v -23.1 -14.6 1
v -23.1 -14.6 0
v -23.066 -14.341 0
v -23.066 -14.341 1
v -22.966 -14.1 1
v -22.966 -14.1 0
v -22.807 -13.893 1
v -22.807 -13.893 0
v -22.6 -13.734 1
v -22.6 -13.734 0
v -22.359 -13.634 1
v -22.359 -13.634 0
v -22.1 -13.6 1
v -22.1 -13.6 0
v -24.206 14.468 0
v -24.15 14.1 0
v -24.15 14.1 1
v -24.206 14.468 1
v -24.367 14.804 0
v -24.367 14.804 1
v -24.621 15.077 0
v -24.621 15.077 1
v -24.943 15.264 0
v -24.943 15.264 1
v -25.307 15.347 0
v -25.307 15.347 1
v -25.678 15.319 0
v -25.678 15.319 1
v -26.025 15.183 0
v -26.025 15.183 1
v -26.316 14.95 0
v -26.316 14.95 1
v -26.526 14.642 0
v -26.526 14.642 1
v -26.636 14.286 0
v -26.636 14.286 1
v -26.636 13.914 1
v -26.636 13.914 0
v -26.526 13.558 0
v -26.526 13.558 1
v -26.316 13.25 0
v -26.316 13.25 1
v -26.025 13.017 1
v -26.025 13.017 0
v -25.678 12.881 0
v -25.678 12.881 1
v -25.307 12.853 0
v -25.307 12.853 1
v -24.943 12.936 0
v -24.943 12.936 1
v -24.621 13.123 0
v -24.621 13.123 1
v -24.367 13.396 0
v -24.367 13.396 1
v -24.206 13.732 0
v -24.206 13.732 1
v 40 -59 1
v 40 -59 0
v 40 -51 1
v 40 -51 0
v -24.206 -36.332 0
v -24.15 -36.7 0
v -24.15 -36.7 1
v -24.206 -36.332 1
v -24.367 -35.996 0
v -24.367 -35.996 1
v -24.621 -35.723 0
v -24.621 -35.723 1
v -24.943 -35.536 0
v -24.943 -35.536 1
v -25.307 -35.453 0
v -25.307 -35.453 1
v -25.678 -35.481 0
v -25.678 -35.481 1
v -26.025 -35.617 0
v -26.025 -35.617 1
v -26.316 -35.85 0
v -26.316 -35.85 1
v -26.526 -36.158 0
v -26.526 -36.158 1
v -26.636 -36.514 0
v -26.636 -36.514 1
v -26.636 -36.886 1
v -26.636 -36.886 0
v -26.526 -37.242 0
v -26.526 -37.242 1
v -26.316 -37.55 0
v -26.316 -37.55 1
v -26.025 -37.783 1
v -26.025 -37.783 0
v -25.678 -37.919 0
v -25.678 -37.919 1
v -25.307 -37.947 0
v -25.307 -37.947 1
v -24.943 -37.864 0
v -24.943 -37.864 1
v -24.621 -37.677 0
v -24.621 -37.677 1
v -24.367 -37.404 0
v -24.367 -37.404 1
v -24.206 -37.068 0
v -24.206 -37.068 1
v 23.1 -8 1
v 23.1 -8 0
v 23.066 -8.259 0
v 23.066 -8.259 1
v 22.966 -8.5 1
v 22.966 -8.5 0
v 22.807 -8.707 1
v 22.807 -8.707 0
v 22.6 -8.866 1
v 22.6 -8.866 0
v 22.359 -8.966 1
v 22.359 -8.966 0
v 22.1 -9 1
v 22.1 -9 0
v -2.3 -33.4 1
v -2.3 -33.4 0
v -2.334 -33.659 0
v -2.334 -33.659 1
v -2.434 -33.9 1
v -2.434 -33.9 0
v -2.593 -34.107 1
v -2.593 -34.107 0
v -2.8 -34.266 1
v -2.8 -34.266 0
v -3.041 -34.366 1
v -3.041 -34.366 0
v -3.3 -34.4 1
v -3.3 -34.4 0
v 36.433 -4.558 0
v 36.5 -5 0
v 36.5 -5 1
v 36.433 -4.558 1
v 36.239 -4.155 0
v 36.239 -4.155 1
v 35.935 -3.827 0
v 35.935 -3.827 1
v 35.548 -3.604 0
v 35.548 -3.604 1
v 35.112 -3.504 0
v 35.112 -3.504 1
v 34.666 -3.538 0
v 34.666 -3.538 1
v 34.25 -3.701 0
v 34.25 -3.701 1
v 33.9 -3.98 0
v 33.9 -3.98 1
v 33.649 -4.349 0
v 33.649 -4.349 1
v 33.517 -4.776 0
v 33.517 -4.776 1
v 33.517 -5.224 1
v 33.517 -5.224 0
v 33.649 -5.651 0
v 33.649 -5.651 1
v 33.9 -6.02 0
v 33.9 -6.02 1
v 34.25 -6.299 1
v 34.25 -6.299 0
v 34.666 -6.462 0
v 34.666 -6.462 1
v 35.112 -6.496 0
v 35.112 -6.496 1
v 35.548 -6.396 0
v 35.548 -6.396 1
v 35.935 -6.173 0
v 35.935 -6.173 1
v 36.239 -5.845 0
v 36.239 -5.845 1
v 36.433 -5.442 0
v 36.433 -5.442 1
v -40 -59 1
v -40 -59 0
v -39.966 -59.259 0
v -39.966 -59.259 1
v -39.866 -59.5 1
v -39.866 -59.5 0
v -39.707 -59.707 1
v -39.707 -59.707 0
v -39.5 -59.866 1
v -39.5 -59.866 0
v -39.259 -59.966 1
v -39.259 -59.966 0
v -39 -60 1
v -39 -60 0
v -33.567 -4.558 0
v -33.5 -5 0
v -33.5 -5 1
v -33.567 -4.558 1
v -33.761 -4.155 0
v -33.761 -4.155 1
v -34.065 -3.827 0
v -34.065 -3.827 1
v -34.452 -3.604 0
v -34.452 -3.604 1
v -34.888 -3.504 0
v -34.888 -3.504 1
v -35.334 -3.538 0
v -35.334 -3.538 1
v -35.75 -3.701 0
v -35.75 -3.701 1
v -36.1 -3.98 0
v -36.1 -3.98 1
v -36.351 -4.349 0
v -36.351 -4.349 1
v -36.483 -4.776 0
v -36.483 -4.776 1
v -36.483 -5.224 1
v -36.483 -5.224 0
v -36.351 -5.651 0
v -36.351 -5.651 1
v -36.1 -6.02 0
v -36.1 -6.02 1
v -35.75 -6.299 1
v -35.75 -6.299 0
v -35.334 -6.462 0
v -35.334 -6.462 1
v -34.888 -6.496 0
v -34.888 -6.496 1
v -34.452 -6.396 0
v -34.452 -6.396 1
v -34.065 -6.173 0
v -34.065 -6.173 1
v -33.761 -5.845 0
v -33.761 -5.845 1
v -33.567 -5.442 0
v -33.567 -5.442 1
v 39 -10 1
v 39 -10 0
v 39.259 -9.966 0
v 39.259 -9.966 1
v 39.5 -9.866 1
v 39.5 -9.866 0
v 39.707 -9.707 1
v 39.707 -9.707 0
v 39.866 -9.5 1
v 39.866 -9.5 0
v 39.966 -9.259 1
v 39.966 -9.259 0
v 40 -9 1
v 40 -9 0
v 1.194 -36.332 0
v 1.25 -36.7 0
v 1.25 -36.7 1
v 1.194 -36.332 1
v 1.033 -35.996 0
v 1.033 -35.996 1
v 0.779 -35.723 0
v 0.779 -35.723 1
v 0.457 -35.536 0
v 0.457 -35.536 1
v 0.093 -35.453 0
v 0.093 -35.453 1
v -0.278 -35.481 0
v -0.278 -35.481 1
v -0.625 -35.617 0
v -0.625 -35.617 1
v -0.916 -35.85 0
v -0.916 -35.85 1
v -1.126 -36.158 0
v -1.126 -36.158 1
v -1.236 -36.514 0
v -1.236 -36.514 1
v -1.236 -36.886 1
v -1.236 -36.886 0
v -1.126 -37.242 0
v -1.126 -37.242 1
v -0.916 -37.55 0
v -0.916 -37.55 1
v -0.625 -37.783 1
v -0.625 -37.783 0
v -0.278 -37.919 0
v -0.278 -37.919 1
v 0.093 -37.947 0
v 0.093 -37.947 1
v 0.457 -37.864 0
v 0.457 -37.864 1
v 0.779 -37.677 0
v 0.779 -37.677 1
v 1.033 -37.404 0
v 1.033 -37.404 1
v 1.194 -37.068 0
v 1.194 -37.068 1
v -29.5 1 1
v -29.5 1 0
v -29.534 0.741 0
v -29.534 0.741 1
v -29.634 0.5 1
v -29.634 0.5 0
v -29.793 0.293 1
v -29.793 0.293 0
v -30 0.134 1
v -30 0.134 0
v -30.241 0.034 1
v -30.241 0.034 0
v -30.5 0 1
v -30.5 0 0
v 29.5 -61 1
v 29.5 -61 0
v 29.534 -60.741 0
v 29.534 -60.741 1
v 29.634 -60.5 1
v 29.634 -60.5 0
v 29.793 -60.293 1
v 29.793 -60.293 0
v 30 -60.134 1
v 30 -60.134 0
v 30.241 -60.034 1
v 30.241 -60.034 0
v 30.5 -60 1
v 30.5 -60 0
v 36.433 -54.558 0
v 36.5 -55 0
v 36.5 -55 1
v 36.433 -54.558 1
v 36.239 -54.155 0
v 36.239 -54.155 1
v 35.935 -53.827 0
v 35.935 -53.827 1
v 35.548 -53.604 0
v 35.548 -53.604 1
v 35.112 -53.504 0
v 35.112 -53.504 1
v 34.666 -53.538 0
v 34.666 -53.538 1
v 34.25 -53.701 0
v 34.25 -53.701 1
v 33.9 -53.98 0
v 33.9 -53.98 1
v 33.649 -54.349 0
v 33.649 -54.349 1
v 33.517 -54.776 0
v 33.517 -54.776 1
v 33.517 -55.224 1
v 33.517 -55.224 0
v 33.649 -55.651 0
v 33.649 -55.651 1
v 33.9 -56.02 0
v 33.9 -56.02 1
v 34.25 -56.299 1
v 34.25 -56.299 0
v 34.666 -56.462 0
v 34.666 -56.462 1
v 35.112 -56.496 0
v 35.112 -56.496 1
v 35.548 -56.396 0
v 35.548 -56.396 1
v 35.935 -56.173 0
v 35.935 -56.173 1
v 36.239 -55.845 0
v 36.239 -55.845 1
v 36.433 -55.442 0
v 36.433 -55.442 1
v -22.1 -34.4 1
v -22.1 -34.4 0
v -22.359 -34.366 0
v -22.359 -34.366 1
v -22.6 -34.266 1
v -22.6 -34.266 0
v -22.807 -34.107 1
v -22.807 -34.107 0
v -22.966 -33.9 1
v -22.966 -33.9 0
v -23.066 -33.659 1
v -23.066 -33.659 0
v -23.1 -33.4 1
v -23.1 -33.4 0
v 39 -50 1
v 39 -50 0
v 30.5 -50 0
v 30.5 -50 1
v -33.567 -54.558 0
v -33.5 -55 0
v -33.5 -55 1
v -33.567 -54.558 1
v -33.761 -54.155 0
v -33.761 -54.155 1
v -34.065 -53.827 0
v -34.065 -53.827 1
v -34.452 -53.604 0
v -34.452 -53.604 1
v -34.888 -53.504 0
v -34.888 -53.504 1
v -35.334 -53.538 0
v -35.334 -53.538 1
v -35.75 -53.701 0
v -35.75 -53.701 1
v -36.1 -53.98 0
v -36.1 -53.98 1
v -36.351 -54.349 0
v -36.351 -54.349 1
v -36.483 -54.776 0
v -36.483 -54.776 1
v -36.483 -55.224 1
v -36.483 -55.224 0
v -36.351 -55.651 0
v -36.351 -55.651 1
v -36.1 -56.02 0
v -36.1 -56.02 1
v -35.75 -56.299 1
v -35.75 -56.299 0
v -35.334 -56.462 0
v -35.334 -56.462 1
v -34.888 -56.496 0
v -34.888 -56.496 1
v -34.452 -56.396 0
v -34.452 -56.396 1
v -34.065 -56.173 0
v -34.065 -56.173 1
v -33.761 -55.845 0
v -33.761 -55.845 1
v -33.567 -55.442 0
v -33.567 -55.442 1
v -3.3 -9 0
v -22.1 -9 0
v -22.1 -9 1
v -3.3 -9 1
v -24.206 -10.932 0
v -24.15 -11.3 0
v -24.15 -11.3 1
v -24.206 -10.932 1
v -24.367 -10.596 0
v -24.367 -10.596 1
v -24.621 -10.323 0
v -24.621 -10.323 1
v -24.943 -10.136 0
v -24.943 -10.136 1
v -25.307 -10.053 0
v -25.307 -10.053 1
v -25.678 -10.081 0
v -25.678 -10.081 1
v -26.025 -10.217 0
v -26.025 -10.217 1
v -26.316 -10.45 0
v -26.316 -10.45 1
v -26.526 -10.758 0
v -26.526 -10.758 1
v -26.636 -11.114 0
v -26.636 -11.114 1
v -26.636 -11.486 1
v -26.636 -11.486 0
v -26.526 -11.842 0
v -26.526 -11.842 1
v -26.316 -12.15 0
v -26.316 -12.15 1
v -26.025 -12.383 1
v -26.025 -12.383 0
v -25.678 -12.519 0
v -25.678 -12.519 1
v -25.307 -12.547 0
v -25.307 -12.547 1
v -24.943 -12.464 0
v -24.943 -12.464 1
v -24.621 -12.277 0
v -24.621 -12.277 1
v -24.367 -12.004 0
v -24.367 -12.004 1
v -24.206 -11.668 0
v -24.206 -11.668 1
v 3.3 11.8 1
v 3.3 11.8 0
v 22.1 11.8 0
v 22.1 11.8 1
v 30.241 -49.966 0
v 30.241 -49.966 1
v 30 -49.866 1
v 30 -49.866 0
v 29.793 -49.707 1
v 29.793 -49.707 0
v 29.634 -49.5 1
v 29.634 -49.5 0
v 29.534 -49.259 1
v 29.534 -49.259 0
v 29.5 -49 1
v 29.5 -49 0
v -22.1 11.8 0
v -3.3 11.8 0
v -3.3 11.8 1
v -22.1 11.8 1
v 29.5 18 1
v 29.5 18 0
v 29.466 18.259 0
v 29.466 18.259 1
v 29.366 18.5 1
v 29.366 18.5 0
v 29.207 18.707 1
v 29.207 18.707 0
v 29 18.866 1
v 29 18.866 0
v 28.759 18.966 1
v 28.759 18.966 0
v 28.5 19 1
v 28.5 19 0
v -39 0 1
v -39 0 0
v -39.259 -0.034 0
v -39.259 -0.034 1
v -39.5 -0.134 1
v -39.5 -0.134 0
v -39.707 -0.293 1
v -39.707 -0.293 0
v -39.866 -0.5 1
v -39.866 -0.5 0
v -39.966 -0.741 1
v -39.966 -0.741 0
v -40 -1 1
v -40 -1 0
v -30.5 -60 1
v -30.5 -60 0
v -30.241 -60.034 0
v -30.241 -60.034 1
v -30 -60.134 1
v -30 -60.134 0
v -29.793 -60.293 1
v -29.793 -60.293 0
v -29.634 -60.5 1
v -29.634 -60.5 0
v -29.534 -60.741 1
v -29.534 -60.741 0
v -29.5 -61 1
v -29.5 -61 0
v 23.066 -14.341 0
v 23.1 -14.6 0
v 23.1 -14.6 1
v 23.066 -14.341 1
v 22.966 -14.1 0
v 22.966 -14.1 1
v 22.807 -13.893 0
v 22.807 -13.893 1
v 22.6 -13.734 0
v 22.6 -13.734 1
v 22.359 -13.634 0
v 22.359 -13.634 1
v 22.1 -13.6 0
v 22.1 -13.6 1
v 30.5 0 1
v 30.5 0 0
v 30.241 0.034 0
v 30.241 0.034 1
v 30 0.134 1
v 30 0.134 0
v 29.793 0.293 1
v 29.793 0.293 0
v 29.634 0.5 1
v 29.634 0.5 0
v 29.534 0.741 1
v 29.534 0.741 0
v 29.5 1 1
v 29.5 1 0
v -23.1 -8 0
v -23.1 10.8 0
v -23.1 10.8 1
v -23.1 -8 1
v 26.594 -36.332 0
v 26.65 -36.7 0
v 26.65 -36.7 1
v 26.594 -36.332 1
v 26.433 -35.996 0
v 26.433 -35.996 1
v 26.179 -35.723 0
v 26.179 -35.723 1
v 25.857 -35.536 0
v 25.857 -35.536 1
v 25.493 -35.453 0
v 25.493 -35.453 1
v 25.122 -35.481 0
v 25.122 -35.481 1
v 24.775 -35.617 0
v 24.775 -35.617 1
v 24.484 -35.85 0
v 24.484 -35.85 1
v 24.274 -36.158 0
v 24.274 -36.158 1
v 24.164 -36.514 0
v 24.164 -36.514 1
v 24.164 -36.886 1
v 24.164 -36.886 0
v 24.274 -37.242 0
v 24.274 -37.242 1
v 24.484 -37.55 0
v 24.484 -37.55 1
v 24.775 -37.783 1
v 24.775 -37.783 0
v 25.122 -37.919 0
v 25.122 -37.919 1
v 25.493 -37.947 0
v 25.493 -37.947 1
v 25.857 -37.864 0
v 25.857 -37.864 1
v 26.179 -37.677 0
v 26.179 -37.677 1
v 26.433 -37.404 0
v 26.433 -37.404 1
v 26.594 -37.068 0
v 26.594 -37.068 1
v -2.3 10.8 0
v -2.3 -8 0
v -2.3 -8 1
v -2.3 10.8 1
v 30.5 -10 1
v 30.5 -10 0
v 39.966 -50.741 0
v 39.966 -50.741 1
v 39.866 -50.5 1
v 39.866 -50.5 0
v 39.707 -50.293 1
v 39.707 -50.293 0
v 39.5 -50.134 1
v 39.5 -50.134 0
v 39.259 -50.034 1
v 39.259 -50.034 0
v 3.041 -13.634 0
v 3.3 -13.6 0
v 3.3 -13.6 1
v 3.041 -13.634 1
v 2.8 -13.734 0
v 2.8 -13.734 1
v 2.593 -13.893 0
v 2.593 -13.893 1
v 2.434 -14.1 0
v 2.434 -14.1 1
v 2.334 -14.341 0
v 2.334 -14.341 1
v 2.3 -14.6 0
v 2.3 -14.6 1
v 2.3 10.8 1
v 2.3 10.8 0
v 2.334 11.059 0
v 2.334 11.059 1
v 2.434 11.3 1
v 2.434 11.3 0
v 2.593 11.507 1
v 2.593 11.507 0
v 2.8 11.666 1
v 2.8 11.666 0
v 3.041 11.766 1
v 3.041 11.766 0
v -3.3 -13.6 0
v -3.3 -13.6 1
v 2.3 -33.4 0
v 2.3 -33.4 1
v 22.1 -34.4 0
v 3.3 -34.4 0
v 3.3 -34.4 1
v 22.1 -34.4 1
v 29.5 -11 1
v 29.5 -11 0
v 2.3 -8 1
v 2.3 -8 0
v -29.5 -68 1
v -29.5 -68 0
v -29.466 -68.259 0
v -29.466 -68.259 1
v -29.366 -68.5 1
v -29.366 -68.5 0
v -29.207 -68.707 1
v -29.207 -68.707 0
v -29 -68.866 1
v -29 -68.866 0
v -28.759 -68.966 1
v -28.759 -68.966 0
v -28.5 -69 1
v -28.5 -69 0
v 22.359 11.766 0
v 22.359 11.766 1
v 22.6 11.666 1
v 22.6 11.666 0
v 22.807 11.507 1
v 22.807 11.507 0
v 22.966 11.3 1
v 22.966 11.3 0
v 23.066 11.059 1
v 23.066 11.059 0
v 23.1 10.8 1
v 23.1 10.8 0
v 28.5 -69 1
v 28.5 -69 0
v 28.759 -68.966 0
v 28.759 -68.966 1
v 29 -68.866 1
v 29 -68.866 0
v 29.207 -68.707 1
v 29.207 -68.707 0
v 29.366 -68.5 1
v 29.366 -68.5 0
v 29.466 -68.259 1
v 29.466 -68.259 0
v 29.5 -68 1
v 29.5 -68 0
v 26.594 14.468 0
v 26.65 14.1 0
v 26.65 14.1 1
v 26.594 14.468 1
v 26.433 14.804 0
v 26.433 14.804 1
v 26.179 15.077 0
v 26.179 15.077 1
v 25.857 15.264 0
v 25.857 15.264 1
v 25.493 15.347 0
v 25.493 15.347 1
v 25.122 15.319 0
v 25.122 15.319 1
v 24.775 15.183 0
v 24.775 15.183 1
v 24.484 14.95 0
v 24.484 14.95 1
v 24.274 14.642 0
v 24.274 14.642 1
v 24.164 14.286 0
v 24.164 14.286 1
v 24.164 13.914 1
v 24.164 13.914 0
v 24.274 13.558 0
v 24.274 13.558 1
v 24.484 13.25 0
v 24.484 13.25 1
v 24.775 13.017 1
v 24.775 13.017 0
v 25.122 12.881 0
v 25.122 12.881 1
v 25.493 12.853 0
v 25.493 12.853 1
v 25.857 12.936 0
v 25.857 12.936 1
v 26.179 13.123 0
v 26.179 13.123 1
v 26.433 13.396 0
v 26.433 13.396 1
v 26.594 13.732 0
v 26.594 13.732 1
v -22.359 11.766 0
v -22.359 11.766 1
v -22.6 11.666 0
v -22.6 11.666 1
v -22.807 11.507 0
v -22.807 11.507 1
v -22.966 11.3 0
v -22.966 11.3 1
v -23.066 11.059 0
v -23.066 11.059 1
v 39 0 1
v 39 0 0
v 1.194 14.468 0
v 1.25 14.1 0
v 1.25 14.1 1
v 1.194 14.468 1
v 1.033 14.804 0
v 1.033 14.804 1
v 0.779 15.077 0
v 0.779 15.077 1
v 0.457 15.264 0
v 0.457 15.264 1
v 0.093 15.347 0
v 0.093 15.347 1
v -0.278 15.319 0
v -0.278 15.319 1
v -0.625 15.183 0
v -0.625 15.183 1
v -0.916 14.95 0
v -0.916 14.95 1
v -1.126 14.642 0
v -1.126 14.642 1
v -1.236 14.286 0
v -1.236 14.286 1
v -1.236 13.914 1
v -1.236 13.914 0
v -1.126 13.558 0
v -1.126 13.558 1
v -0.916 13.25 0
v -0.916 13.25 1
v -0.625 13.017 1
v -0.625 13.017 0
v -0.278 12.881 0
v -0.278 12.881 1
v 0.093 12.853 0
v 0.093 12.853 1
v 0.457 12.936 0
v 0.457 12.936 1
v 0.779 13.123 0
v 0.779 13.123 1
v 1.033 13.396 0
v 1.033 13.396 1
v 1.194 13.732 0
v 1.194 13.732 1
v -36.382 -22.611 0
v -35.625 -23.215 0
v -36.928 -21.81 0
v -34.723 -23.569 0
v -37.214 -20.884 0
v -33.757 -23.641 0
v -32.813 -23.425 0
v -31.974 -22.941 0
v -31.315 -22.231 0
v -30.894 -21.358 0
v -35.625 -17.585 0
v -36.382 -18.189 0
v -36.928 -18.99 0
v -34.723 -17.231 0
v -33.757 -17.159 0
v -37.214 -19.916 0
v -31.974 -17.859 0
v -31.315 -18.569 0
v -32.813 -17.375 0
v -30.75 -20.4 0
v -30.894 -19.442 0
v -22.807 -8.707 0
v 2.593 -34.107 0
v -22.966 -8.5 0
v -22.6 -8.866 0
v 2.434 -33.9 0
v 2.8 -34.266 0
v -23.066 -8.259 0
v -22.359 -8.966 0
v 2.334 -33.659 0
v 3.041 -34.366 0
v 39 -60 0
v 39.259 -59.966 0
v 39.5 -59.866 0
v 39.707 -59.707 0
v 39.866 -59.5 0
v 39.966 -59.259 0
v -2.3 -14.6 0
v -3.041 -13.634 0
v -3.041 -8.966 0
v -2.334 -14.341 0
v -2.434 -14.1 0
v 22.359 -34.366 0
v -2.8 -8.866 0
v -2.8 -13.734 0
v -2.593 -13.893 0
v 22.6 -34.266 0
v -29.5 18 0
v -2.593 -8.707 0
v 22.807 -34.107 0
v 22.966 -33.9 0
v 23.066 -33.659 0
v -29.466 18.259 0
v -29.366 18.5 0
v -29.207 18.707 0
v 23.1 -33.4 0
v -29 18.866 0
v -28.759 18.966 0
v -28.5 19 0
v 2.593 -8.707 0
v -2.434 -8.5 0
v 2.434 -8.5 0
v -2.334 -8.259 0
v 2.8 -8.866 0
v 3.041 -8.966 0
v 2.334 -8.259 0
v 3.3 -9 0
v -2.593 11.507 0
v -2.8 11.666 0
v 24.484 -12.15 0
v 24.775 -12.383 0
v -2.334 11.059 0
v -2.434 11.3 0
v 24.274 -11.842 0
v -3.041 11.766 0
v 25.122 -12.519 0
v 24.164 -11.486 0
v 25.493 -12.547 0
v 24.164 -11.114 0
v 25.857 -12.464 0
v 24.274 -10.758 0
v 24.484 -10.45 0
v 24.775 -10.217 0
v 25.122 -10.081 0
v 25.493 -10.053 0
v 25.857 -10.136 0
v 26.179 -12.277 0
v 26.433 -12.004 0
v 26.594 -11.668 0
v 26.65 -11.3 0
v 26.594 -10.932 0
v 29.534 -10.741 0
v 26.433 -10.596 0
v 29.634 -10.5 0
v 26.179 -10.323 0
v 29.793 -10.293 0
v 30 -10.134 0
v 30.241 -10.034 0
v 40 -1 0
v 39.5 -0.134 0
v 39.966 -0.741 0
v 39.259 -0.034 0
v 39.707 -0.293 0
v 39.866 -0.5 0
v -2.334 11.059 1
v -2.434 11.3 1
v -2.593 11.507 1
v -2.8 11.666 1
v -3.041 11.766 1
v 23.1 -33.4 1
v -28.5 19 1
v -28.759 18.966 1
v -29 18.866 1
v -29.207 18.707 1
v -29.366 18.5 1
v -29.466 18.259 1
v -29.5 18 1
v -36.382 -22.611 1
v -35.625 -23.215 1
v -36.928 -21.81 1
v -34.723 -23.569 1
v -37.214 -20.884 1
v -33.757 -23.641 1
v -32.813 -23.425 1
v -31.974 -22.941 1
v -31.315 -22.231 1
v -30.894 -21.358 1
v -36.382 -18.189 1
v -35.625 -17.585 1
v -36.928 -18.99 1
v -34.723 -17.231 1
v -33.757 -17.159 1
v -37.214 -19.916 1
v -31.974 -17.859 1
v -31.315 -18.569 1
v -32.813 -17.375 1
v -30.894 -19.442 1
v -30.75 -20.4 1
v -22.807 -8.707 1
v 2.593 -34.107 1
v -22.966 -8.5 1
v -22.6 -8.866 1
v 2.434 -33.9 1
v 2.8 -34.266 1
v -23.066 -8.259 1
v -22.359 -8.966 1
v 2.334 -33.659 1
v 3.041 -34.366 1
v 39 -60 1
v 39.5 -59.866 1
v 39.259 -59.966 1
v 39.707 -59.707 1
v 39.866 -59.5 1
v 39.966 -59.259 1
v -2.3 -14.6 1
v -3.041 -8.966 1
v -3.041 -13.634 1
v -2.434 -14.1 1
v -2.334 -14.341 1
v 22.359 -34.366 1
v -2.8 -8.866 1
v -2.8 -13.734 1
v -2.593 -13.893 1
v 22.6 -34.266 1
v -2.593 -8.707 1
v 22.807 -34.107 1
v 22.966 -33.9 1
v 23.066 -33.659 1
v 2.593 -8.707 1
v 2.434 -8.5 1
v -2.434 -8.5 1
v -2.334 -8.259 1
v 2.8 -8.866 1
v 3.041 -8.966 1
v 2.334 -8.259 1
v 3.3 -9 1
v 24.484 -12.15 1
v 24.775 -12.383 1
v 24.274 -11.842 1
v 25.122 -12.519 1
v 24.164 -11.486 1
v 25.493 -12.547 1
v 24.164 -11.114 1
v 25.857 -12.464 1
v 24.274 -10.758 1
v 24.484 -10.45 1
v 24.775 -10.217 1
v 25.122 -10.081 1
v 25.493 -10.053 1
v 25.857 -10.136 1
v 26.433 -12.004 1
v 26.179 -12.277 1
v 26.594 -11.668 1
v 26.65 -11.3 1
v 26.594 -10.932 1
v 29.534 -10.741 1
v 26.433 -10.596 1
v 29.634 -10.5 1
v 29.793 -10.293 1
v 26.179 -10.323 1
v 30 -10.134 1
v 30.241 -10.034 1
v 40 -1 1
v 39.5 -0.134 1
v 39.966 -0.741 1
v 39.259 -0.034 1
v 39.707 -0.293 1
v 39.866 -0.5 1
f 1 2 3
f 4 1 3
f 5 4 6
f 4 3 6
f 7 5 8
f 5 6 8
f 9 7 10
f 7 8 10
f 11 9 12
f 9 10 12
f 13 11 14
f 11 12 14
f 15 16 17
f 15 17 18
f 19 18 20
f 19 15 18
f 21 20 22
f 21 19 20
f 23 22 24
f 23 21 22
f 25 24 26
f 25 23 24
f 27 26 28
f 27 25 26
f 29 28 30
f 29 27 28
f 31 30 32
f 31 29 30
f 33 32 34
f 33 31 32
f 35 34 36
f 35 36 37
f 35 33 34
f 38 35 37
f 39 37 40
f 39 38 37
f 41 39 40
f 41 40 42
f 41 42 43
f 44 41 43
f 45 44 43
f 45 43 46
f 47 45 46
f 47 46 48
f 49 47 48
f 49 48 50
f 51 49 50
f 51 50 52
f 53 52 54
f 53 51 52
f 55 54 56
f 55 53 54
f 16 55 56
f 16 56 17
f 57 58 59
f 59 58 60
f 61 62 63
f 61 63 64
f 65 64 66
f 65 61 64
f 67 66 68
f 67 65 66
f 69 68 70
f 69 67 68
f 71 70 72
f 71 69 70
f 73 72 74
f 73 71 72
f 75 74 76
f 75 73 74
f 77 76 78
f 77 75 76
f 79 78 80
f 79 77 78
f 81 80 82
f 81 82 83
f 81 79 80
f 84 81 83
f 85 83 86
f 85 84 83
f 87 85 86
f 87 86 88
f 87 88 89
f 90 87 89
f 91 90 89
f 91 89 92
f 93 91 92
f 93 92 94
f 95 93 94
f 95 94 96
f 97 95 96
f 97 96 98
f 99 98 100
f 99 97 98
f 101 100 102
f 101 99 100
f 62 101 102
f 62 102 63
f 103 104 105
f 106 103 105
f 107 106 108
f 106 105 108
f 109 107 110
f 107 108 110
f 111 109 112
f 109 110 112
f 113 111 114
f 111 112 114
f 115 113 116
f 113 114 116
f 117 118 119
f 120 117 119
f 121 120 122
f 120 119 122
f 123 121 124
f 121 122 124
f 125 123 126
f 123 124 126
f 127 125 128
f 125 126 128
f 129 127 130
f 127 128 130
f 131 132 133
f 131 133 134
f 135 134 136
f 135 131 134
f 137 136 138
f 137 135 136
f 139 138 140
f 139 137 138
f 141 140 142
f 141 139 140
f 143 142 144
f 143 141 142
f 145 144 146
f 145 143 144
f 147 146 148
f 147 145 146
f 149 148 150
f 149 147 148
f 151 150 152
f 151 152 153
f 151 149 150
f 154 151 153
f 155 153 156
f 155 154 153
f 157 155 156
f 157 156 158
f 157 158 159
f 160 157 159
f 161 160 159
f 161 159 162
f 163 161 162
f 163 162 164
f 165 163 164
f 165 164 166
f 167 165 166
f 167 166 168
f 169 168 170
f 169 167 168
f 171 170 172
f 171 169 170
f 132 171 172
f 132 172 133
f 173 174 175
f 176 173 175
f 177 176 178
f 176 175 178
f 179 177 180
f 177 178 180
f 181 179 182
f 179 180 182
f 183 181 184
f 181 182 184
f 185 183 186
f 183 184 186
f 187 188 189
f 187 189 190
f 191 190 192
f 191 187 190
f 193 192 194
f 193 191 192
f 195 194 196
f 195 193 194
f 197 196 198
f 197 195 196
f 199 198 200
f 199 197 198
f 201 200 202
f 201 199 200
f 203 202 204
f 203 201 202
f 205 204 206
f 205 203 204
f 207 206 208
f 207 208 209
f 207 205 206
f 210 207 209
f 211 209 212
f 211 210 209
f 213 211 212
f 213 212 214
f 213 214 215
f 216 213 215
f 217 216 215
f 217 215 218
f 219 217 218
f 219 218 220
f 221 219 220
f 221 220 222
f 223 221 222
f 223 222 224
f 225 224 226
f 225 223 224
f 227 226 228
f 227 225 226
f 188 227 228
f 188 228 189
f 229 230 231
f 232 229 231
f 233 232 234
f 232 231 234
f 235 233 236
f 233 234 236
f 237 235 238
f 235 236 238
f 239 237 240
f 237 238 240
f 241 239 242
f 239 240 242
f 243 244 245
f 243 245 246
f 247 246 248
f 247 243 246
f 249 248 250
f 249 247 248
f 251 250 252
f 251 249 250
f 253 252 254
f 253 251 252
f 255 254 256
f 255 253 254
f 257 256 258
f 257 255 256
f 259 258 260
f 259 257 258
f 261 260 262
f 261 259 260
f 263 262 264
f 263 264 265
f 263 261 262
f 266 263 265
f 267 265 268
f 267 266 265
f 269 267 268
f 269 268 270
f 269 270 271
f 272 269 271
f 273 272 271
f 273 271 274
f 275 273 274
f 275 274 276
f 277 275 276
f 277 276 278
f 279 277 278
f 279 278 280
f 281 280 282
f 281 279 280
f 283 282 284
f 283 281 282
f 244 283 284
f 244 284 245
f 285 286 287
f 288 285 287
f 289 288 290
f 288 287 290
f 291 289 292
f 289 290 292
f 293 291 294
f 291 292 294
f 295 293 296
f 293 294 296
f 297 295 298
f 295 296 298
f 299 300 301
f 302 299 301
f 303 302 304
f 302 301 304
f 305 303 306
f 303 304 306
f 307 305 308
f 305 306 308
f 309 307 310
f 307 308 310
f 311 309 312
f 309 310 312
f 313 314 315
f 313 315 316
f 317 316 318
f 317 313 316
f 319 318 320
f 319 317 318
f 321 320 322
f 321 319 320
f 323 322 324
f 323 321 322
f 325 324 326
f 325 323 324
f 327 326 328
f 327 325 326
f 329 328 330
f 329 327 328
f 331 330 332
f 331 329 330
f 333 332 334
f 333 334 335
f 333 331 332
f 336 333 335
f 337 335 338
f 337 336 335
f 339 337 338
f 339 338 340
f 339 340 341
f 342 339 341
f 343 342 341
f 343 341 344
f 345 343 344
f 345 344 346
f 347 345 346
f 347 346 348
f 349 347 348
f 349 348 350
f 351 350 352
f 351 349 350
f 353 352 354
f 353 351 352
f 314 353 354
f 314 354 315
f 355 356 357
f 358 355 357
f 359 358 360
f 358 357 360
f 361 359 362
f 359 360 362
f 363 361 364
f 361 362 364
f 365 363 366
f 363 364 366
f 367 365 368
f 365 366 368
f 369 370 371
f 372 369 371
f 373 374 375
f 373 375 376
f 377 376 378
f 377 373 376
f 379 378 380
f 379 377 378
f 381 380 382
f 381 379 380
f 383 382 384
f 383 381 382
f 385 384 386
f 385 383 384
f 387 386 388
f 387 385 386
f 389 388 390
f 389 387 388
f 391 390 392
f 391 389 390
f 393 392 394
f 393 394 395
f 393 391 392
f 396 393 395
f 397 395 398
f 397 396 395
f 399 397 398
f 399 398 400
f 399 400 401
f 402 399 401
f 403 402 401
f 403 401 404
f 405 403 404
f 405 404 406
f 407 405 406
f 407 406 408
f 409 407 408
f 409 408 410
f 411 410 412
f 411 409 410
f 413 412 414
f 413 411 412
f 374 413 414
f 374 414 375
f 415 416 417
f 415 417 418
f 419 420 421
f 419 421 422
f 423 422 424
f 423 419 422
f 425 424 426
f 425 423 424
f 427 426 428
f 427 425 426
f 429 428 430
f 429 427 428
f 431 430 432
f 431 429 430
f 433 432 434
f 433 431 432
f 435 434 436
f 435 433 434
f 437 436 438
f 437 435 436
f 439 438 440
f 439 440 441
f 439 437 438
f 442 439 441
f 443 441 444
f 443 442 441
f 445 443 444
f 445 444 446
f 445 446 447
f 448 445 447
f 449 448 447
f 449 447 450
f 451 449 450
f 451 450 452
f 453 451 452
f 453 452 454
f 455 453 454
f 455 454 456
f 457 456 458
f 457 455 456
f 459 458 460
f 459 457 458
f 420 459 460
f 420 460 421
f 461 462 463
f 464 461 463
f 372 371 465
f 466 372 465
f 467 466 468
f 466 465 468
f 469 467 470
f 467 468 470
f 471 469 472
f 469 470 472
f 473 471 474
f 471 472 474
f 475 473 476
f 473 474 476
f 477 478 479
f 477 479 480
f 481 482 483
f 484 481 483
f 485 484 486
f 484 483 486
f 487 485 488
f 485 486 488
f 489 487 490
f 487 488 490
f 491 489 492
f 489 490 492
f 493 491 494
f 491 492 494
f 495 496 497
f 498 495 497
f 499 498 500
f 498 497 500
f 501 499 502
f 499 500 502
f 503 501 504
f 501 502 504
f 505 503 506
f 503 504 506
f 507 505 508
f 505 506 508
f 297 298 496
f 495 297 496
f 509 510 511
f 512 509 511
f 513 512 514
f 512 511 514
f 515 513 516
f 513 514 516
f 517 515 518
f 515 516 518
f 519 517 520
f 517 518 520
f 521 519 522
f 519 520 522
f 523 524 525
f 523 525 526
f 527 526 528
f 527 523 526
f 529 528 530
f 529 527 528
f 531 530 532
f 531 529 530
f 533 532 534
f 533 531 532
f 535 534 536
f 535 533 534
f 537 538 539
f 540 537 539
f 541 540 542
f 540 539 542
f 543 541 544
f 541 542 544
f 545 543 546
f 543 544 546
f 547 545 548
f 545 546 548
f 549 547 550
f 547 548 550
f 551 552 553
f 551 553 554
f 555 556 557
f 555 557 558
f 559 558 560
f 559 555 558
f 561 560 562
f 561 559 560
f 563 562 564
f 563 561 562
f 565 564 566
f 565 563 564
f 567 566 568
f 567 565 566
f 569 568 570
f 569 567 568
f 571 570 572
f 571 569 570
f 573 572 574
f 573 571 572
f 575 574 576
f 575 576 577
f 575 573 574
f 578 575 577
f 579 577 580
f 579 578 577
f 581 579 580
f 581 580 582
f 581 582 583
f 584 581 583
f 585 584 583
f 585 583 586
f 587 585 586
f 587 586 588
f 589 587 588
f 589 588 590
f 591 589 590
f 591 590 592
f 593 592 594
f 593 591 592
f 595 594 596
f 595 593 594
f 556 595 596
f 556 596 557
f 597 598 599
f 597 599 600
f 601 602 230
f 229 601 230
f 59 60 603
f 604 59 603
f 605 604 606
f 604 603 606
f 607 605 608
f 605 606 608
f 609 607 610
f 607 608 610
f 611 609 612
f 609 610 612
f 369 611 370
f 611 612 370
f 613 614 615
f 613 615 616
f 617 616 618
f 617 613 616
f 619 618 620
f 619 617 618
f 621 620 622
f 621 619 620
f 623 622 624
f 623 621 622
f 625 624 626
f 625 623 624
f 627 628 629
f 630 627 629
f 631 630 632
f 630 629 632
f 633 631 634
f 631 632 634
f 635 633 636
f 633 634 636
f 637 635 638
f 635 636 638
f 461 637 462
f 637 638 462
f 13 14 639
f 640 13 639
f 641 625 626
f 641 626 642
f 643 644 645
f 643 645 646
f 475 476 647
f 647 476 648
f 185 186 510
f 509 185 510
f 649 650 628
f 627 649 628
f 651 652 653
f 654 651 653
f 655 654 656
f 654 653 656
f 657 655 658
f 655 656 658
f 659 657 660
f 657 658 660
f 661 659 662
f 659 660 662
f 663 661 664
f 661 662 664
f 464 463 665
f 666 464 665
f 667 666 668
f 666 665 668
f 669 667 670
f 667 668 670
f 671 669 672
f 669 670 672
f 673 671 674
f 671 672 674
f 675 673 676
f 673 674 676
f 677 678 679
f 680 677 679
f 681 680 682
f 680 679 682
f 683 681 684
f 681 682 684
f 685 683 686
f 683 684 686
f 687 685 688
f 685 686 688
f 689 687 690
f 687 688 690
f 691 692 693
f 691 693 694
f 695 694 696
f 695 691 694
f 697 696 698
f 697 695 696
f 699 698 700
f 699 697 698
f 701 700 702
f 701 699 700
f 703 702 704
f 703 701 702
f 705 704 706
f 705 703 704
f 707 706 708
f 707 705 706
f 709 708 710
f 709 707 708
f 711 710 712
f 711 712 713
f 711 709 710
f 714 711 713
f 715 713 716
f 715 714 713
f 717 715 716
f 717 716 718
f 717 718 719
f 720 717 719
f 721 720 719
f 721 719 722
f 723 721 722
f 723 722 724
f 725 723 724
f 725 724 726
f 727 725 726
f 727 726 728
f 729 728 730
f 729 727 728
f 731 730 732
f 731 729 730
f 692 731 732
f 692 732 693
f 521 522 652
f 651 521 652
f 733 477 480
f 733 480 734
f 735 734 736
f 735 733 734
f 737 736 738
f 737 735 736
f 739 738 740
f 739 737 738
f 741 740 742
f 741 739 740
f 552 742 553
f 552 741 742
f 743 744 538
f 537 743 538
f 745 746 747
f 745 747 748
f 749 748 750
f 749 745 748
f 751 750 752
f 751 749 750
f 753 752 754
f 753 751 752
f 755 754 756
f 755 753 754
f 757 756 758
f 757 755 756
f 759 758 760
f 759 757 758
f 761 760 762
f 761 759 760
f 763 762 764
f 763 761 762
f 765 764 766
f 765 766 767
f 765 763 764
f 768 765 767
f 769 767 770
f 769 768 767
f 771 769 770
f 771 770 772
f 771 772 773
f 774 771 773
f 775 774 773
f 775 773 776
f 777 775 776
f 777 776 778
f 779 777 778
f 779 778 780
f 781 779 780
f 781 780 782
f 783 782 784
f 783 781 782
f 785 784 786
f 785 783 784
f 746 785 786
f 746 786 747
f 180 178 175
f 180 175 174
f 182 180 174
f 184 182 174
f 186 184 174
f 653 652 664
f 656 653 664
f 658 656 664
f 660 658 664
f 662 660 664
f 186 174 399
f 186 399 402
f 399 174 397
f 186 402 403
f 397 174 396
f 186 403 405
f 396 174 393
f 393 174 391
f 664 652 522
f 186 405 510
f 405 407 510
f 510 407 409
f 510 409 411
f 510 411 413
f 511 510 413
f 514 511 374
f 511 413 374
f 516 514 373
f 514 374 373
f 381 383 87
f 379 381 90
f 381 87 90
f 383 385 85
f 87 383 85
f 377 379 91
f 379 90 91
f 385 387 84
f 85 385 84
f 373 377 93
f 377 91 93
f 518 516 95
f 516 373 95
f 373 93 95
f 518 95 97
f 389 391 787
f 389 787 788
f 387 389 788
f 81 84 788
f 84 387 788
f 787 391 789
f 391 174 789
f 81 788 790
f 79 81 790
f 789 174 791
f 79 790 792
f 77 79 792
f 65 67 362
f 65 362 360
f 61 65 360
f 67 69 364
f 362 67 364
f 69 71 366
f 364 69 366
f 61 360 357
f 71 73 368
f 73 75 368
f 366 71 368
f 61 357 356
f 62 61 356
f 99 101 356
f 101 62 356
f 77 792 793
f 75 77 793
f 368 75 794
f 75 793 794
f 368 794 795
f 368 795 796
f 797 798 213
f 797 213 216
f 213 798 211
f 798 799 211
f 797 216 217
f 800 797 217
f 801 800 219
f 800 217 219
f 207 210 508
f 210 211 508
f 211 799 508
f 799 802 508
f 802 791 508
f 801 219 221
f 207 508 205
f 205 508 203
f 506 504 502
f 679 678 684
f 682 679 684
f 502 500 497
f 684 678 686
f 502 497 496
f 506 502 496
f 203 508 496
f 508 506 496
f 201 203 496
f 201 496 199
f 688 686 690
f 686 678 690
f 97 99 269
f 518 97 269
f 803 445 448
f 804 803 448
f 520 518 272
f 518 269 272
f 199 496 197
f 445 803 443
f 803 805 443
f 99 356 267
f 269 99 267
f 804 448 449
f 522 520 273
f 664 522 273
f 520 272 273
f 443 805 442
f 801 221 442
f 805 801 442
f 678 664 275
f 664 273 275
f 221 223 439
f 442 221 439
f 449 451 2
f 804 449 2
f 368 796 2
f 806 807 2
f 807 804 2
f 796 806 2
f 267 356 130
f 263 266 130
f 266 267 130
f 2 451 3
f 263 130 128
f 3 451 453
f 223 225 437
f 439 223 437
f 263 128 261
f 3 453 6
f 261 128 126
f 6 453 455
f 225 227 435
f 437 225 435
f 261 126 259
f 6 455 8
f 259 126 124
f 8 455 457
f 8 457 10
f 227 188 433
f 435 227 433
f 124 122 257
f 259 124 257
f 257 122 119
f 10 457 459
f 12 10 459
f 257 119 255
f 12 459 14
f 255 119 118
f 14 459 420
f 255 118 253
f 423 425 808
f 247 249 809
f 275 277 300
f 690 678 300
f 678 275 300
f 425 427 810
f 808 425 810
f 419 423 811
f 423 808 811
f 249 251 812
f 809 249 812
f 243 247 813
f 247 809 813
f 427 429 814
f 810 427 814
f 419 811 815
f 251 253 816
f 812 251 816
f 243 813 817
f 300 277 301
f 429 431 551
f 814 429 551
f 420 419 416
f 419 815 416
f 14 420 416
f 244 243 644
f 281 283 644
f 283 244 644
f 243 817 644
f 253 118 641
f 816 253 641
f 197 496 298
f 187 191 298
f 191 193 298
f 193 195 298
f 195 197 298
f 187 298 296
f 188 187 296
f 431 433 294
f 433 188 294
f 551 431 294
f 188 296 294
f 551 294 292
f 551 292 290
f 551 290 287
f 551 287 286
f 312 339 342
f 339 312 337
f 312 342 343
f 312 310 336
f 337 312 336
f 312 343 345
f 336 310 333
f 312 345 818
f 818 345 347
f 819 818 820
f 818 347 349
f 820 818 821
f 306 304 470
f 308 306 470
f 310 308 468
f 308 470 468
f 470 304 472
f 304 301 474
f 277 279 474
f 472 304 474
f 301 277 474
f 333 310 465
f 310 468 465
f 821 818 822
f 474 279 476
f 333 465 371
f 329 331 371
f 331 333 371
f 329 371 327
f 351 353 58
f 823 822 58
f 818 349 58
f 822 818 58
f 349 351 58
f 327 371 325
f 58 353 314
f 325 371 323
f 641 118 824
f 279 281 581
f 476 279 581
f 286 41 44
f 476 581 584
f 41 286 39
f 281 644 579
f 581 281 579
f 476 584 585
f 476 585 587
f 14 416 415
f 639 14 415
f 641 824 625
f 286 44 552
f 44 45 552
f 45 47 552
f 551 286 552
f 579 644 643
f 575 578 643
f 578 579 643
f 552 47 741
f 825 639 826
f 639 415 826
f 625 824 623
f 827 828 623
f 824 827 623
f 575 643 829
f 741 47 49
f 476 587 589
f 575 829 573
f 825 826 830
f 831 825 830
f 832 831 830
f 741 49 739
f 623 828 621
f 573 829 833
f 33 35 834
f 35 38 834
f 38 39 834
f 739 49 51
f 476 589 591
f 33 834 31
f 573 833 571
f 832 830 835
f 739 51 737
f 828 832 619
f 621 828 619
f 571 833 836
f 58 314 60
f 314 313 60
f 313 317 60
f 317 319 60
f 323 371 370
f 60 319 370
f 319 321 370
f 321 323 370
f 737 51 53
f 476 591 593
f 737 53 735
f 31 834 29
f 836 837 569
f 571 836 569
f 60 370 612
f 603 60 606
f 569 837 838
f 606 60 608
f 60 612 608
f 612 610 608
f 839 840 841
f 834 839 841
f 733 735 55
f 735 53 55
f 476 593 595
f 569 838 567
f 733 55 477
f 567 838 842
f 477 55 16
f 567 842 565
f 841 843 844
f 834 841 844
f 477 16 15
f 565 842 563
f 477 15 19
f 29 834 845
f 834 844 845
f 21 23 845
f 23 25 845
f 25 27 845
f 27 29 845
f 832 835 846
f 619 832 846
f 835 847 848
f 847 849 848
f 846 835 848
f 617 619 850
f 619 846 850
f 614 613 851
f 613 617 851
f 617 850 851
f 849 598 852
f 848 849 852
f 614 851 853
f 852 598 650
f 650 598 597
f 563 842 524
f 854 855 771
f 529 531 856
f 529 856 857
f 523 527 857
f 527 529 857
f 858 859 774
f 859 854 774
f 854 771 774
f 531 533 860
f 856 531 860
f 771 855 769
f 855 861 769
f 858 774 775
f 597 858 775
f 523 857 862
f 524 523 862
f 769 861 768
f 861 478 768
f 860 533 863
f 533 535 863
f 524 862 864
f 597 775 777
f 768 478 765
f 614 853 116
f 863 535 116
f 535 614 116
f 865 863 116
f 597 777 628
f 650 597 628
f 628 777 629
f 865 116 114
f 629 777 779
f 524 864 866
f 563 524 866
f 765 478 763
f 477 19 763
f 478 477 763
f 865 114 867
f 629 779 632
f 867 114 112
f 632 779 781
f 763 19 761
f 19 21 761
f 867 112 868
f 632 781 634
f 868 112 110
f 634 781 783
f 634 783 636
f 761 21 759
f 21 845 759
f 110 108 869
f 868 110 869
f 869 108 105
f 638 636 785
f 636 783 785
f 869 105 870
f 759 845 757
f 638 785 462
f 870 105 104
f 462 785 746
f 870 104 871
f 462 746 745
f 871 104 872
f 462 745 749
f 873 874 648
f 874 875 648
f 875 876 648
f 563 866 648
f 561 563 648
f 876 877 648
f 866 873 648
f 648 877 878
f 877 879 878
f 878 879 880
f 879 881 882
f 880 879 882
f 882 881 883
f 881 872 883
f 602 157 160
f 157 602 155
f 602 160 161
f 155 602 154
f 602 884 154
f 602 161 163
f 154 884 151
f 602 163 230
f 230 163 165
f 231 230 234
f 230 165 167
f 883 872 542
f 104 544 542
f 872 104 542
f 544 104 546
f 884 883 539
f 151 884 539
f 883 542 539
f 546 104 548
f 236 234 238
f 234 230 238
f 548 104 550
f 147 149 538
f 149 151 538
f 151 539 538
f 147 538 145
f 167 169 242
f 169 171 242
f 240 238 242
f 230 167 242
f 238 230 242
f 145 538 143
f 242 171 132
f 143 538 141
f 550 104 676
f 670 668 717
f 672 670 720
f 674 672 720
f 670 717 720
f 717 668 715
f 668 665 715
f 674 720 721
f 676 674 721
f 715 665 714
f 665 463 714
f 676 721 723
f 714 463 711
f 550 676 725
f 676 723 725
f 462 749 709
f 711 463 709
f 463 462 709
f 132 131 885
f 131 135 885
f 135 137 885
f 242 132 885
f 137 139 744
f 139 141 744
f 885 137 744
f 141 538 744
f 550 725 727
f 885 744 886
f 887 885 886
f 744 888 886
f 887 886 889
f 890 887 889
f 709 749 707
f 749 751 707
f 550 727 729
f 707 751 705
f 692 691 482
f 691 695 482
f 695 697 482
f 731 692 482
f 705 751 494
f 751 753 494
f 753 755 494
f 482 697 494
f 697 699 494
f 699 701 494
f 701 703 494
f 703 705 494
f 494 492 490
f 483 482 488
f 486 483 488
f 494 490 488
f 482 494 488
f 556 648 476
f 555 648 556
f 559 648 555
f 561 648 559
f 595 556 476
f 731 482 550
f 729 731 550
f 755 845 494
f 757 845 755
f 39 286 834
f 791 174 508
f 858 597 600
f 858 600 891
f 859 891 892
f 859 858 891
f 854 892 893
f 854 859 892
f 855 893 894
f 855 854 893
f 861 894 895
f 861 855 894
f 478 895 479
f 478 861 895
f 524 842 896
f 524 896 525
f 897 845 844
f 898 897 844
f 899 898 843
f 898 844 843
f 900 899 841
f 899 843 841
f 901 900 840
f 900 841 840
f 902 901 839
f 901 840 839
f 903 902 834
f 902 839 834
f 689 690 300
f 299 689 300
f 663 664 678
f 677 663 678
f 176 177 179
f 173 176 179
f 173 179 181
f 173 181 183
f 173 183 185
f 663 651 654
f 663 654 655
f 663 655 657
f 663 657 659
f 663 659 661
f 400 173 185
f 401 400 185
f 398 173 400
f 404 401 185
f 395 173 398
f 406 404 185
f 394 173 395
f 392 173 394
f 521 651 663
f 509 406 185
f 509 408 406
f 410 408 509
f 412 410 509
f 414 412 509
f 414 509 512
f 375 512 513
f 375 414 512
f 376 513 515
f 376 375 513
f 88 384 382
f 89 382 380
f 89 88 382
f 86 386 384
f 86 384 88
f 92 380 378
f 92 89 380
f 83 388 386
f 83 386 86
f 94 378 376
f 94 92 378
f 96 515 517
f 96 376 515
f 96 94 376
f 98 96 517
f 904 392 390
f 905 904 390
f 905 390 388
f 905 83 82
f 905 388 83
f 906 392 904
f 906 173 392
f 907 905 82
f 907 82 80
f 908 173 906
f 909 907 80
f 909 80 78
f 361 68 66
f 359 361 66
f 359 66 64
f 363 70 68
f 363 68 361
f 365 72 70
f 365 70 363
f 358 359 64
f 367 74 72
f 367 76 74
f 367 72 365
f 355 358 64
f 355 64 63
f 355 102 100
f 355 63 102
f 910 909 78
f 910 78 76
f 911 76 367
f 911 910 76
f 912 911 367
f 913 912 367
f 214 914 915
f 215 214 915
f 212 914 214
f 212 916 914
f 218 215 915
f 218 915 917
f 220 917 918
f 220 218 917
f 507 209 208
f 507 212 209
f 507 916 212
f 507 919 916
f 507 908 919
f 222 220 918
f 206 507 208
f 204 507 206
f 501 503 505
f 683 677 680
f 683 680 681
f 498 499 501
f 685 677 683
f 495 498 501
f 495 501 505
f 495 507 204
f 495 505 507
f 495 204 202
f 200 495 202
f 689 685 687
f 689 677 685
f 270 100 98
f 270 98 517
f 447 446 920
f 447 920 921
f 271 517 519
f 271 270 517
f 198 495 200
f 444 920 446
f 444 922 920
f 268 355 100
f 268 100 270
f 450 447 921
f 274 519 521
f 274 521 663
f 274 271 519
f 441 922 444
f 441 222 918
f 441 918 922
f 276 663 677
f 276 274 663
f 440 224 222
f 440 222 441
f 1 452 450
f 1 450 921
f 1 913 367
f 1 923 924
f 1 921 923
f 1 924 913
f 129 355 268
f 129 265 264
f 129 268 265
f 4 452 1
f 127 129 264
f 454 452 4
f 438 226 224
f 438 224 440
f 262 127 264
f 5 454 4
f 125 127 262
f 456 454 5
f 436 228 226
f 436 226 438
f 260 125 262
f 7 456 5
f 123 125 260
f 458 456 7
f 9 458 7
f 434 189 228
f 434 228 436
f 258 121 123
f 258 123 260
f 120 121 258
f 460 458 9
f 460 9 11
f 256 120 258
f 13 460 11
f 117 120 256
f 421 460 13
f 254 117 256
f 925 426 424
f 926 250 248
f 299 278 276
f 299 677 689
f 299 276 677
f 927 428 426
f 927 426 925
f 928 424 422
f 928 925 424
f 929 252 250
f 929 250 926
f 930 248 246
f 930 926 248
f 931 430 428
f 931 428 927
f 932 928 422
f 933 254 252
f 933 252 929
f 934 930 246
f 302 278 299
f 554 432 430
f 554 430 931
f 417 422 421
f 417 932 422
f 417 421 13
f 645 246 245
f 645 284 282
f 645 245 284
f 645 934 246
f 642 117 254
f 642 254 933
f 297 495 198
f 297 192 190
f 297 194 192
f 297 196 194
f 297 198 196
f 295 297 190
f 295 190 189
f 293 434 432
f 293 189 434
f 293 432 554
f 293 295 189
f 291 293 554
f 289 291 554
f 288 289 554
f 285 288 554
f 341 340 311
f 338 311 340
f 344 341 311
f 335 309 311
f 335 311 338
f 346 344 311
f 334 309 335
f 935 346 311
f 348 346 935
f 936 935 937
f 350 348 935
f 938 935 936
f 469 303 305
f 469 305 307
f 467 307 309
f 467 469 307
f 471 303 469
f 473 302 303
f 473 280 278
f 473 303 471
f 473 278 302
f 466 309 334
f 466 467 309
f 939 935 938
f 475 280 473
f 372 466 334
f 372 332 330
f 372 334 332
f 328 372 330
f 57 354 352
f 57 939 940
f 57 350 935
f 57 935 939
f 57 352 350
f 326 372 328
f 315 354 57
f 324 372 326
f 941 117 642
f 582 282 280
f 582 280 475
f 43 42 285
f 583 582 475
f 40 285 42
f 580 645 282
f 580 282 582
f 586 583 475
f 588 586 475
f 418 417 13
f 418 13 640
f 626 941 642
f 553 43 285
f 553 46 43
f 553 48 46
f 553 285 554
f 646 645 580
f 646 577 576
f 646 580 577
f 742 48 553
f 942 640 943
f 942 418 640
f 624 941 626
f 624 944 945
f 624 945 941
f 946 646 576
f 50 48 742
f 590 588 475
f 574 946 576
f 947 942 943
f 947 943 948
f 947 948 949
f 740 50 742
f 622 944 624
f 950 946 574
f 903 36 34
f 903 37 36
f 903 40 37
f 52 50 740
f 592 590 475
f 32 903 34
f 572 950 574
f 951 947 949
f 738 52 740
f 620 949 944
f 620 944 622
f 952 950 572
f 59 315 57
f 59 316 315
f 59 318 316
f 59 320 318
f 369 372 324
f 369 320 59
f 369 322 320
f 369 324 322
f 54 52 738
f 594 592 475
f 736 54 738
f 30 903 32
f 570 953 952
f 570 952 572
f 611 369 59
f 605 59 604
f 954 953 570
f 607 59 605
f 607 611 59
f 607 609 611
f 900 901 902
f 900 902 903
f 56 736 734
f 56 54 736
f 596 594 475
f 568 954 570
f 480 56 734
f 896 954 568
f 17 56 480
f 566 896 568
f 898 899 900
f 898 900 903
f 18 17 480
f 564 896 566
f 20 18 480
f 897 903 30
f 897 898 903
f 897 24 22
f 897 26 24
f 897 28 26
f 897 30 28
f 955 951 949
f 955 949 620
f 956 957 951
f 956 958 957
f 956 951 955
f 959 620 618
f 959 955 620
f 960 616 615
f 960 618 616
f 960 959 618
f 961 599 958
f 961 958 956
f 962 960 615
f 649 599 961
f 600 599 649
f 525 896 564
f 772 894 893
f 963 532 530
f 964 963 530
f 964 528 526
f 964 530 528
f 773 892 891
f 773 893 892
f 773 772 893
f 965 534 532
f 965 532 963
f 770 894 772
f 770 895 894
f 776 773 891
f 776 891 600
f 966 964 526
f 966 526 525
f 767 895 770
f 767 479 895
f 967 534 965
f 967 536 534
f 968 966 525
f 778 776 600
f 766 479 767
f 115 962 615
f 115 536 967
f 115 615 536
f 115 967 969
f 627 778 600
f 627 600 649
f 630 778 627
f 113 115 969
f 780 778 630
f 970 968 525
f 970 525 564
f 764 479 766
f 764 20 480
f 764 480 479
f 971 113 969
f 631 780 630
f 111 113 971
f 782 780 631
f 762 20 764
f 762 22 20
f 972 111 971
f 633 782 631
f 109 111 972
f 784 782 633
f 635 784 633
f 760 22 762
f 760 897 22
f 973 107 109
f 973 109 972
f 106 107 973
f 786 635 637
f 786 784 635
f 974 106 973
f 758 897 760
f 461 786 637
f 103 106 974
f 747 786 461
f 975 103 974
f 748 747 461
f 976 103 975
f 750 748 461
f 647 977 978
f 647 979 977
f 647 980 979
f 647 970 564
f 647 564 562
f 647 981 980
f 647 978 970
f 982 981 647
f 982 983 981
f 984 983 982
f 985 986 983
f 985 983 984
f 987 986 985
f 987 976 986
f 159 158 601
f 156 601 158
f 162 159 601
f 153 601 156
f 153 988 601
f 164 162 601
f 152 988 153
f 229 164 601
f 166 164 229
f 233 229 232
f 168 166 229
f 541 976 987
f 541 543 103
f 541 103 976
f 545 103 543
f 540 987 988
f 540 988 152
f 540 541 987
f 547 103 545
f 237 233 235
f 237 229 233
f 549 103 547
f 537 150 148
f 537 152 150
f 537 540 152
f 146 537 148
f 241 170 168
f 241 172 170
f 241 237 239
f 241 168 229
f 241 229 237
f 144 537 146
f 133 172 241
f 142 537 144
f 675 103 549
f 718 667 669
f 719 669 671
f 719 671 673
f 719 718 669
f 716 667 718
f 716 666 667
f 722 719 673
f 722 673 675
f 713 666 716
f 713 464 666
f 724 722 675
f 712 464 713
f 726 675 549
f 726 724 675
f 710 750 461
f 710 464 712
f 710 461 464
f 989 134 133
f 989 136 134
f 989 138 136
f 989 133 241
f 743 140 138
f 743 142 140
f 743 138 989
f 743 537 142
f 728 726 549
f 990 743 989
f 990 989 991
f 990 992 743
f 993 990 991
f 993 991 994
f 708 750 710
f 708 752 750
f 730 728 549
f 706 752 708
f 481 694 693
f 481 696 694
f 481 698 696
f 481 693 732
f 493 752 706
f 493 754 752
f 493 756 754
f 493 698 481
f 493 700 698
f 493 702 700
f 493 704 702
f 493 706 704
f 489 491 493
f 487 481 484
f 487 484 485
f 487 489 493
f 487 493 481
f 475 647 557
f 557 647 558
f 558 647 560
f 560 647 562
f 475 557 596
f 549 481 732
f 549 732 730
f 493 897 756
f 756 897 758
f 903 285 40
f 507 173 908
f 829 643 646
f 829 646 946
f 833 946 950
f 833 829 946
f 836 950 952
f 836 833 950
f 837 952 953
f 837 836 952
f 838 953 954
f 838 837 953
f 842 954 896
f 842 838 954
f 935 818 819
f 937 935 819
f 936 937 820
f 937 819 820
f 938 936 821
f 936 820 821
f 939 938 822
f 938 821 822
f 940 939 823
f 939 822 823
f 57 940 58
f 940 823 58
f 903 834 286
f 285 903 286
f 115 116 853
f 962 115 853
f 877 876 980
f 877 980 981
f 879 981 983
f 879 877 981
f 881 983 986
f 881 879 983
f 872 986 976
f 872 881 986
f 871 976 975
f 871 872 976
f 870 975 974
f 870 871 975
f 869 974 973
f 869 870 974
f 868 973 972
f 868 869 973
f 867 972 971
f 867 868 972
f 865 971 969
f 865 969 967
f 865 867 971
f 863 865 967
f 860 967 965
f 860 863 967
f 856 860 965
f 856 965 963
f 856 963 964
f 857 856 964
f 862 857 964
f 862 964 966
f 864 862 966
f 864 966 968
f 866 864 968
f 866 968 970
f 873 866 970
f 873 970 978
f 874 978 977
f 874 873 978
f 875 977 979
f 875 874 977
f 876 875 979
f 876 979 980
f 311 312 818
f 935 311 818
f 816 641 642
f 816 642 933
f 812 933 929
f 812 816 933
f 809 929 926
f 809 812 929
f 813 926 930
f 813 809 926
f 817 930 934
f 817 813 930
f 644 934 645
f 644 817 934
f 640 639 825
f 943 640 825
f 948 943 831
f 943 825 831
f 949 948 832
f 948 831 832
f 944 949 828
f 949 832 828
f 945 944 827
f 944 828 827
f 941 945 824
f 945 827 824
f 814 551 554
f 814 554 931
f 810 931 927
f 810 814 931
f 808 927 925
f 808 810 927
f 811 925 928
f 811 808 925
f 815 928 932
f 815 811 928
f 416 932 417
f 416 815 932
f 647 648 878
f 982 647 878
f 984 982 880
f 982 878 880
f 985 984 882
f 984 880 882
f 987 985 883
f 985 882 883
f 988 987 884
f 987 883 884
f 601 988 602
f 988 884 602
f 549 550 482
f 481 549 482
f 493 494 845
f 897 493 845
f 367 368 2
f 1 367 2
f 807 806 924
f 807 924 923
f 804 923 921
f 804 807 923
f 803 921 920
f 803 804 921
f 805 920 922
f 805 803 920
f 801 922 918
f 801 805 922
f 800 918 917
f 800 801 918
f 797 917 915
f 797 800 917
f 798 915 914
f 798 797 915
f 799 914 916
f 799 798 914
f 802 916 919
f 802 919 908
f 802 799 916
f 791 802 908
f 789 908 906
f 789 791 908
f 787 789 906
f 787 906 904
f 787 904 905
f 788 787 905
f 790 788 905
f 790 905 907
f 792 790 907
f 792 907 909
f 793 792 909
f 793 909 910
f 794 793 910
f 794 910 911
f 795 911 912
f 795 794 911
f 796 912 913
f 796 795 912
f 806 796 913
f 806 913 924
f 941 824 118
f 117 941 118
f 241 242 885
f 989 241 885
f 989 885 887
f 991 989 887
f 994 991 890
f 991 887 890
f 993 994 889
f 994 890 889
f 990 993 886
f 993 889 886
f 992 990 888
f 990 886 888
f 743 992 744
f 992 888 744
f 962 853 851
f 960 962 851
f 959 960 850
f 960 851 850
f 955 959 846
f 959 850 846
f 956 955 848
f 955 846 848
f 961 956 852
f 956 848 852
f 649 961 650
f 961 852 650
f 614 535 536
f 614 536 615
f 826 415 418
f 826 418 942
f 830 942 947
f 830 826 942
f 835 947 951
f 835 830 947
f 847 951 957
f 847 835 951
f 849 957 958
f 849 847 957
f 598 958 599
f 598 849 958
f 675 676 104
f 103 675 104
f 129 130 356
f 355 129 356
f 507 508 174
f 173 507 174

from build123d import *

# Parameters (mm, degrees)
MODEL_R         = 1.5
MODEL_R_2       = 3.25
MODEL_R_3       = 1.25
EXTRUDE_1_DEPTH = 1


with BuildPart() as part:
    # Model → Бобышка-Вытянуть1 (new body)
    with BuildSketch(Plane.XY):
        with BuildLine():
            Line((-28.5, -69), (28.5, -69))
            ThreePointArc((28.5, -69), (29.207106781, -68.707106781), (29.5, -68))
            Line((29.5, -68), (29.5, -61))
            ThreePointArc((29.5, -61), (29.792893219, -60.292893219), (30.5, -60))
            Line((30.5, -60), (39, -60))
            ThreePointArc((39, -60), (39.707106781, -59.707106781), (40, -59))
            Line((40, -59), (40, -55))
            Line((40, -55), (40, -51))
            ThreePointArc((40, -51), (39.707106781, -50.292893219), (39, -50))
            Line((39, -50), (30.5, -50))
            ThreePointArc((30.5, -50), (29.792893219, -49.707106781), (29.5, -49))
            Line((29.5, -49), (29.5, -11))
            ThreePointArc((29.5, -11), (29.792893219, -10.292893219), (30.5, -10))
            Line((30.5, -10), (39, -10))
            ThreePointArc((39, -10), (39.707106781, -9.707106781), (40, -9))
            Line((40, -9), (40, -5))
            Line((40, -5), (40, -1))
            ThreePointArc((40, -1), (39.707106781, -0.292893219), (39, 0))
            Line((39, 0), (30.5, 0))
            ThreePointArc((30.5, 0), (29.792893219, 0.292893219), (29.5, 1))
            Line((29.5, 1), (29.5, 18))
            ThreePointArc((29.5, 18), (29.207106781, 18.707106781), (28.5, 19))
            Line((28.5, 19), (-28.5, 19))
            ThreePointArc((-28.5, 19), (-29.207106781, 18.707106781), (-29.5, 18))
            Line((-29.5, 18), (-29.5, 1))
            ThreePointArc((-29.5, 1), (-29.792893219, 0.292893219), (-30.5, 0))
            Line((-30.5, 0), (-39, 0))
            ThreePointArc((-39, 0), (-39.707106781, -0.292893219), (-40, -1))
            Line((-40, -1), (-40, -5))
            Line((-40, -5), (-40, -9))
            Line((-40, -9), (-40, -52))
            Line((-40, -52), (-40, -55))
            Line((-40, -55), (-40, -59))
            ThreePointArc((-40, -59), (-39.707106781, -59.707106781), (-39, -60))
            Line((-39, -60), (-30.5, -60))
            ThreePointArc((-30.5, -60), (-29.792893219, -60.292893219), (-29.5, -61))
            Line((-29.5, -61), (-29.5, -68))
            ThreePointArc((-29.5, -68), (-29.207106781, -68.707106781), (-28.5, -69))
        make_face()
        with Locations((-35, -5)):
            Circle(MODEL_R, mode=Mode.SUBTRACT)
        with Locations((-35, -55)):
            Circle(MODEL_R, mode=Mode.SUBTRACT)
        with Locations((35, -5)):
            Circle(MODEL_R, mode=Mode.SUBTRACT)
        with Locations((35, -55)):
            Circle(MODEL_R, mode=Mode.SUBTRACT)
        with Locations((-34, -20.4)):
            Circle(MODEL_R_2, mode=Mode.SUBTRACT)
        with Locations((25.4, -36.7)):
            Circle(MODEL_R_3, mode=Mode.SUBTRACT)
        with Locations((0, -36.7)):
            Circle(MODEL_R_3, mode=Mode.SUBTRACT)
        with Locations((25.4, 14.1)):
            Circle(MODEL_R_3, mode=Mode.SUBTRACT)
        with Locations((0, 14.1)):
            Circle(MODEL_R_3, mode=Mode.SUBTRACT)
        with Locations((-25.4, -11.3)):
            Circle(MODEL_R_3, mode=Mode.SUBTRACT)
        with Locations((-25.4, -36.7)):
            Circle(MODEL_R_3, mode=Mode.SUBTRACT)
        with Locations((-25.4, 14.1)):
            Circle(MODEL_R_3, mode=Mode.SUBTRACT)
        with Locations((25.4, -11.3)):
            Circle(MODEL_R_3, mode=Mode.SUBTRACT)
        with BuildLine():
            Line((-2.3, -8), (-2.3, 10.8))
            ThreePointArc((-2.3, 10.8), (-2.592893219, 11.507106781), (-3.3, 11.8))
            Line((-3.3, 11.8), (-22.1, 11.8))
            ThreePointArc((-22.1, 11.8), (-22.807106781, 11.507106781), (-23.1, 10.8))
            Line((-23.1, 10.8), (-23.1, -8))
            ThreePointArc((-23.1, -8), (-22.807106781, -8.707106781), (-22.1, -9))
            Line((-22.1, -9), (-3.3, -9))
            ThreePointArc((-3.3, -9), (-2.592893219, -8.707106781), (-2.3, -8))
        make_face(mode=Mode.SUBTRACT)
        with BuildLine():
            Line((2.3, -8), (2.3, 10.8))
            ThreePointArc((2.3, 10.8), (2.592893219, 11.507106781), (3.3, 11.8))
            Line((3.3, 11.8), (22.1, 11.8))
            ThreePointArc((22.1, 11.8), (22.807106781, 11.507106781), (23.1, 10.8))
            Line((23.1, 10.8), (23.1, -8))
            ThreePointArc((23.1, -8), (22.807106781, -8.707106781), (22.1, -9))
            Line((22.1, -9), (3.3, -9))
            ThreePointArc((3.3, -9), (2.592893219, -8.707106781), (2.3, -8))
        make_face(mode=Mode.SUBTRACT)
        with BuildLine():
            Line((-2.3, -14.6), (-2.3, -33.4))
            ThreePointArc((-2.3, -33.4), (-2.592893219, -34.107106781), (-3.3, -34.4))
            Line((-3.3, -34.4), (-22.1, -34.4))
            ThreePointArc((-22.1, -34.4), (-22.807106781, -34.107106781), (-23.1, -33.4))
            Line((-23.1, -33.4), (-23.1, -14.6))
            ThreePointArc((-23.1, -14.6), (-22.807106781, -13.892893219), (-22.1, -13.6))
            Line((-22.1, -13.6), (-3.3, -13.6))
            ThreePointArc((-3.3, -13.6), (-2.592893219, -13.892893219), (-2.3, -14.6))
        make_face(mode=Mode.SUBTRACT)
        with BuildLine():
            Line((2.3, -14.6), (2.3, -33.4))
            ThreePointArc((2.3, -33.4), (2.592893219, -34.107106781), (3.3, -34.4))
            Line((3.3, -34.4), (22.1, -34.4))
            ThreePointArc((22.1, -34.4), (22.807106781, -34.107106781), (23.1, -33.4))
            Line((23.1, -33.4), (23.1, -14.6))
            ThreePointArc((23.1, -14.6), (22.807106781, -13.892893219), (22.1, -13.6))
            Line((22.1, -13.6), (3.3, -13.6))
            ThreePointArc((3.3, -13.6), (2.592893219, -13.892893219), (2.3, -14.6))
        make_face(mode=Mode.SUBTRACT)
    extrude(amount=EXTRUDE_1_DEPTH)


solid = part.part
